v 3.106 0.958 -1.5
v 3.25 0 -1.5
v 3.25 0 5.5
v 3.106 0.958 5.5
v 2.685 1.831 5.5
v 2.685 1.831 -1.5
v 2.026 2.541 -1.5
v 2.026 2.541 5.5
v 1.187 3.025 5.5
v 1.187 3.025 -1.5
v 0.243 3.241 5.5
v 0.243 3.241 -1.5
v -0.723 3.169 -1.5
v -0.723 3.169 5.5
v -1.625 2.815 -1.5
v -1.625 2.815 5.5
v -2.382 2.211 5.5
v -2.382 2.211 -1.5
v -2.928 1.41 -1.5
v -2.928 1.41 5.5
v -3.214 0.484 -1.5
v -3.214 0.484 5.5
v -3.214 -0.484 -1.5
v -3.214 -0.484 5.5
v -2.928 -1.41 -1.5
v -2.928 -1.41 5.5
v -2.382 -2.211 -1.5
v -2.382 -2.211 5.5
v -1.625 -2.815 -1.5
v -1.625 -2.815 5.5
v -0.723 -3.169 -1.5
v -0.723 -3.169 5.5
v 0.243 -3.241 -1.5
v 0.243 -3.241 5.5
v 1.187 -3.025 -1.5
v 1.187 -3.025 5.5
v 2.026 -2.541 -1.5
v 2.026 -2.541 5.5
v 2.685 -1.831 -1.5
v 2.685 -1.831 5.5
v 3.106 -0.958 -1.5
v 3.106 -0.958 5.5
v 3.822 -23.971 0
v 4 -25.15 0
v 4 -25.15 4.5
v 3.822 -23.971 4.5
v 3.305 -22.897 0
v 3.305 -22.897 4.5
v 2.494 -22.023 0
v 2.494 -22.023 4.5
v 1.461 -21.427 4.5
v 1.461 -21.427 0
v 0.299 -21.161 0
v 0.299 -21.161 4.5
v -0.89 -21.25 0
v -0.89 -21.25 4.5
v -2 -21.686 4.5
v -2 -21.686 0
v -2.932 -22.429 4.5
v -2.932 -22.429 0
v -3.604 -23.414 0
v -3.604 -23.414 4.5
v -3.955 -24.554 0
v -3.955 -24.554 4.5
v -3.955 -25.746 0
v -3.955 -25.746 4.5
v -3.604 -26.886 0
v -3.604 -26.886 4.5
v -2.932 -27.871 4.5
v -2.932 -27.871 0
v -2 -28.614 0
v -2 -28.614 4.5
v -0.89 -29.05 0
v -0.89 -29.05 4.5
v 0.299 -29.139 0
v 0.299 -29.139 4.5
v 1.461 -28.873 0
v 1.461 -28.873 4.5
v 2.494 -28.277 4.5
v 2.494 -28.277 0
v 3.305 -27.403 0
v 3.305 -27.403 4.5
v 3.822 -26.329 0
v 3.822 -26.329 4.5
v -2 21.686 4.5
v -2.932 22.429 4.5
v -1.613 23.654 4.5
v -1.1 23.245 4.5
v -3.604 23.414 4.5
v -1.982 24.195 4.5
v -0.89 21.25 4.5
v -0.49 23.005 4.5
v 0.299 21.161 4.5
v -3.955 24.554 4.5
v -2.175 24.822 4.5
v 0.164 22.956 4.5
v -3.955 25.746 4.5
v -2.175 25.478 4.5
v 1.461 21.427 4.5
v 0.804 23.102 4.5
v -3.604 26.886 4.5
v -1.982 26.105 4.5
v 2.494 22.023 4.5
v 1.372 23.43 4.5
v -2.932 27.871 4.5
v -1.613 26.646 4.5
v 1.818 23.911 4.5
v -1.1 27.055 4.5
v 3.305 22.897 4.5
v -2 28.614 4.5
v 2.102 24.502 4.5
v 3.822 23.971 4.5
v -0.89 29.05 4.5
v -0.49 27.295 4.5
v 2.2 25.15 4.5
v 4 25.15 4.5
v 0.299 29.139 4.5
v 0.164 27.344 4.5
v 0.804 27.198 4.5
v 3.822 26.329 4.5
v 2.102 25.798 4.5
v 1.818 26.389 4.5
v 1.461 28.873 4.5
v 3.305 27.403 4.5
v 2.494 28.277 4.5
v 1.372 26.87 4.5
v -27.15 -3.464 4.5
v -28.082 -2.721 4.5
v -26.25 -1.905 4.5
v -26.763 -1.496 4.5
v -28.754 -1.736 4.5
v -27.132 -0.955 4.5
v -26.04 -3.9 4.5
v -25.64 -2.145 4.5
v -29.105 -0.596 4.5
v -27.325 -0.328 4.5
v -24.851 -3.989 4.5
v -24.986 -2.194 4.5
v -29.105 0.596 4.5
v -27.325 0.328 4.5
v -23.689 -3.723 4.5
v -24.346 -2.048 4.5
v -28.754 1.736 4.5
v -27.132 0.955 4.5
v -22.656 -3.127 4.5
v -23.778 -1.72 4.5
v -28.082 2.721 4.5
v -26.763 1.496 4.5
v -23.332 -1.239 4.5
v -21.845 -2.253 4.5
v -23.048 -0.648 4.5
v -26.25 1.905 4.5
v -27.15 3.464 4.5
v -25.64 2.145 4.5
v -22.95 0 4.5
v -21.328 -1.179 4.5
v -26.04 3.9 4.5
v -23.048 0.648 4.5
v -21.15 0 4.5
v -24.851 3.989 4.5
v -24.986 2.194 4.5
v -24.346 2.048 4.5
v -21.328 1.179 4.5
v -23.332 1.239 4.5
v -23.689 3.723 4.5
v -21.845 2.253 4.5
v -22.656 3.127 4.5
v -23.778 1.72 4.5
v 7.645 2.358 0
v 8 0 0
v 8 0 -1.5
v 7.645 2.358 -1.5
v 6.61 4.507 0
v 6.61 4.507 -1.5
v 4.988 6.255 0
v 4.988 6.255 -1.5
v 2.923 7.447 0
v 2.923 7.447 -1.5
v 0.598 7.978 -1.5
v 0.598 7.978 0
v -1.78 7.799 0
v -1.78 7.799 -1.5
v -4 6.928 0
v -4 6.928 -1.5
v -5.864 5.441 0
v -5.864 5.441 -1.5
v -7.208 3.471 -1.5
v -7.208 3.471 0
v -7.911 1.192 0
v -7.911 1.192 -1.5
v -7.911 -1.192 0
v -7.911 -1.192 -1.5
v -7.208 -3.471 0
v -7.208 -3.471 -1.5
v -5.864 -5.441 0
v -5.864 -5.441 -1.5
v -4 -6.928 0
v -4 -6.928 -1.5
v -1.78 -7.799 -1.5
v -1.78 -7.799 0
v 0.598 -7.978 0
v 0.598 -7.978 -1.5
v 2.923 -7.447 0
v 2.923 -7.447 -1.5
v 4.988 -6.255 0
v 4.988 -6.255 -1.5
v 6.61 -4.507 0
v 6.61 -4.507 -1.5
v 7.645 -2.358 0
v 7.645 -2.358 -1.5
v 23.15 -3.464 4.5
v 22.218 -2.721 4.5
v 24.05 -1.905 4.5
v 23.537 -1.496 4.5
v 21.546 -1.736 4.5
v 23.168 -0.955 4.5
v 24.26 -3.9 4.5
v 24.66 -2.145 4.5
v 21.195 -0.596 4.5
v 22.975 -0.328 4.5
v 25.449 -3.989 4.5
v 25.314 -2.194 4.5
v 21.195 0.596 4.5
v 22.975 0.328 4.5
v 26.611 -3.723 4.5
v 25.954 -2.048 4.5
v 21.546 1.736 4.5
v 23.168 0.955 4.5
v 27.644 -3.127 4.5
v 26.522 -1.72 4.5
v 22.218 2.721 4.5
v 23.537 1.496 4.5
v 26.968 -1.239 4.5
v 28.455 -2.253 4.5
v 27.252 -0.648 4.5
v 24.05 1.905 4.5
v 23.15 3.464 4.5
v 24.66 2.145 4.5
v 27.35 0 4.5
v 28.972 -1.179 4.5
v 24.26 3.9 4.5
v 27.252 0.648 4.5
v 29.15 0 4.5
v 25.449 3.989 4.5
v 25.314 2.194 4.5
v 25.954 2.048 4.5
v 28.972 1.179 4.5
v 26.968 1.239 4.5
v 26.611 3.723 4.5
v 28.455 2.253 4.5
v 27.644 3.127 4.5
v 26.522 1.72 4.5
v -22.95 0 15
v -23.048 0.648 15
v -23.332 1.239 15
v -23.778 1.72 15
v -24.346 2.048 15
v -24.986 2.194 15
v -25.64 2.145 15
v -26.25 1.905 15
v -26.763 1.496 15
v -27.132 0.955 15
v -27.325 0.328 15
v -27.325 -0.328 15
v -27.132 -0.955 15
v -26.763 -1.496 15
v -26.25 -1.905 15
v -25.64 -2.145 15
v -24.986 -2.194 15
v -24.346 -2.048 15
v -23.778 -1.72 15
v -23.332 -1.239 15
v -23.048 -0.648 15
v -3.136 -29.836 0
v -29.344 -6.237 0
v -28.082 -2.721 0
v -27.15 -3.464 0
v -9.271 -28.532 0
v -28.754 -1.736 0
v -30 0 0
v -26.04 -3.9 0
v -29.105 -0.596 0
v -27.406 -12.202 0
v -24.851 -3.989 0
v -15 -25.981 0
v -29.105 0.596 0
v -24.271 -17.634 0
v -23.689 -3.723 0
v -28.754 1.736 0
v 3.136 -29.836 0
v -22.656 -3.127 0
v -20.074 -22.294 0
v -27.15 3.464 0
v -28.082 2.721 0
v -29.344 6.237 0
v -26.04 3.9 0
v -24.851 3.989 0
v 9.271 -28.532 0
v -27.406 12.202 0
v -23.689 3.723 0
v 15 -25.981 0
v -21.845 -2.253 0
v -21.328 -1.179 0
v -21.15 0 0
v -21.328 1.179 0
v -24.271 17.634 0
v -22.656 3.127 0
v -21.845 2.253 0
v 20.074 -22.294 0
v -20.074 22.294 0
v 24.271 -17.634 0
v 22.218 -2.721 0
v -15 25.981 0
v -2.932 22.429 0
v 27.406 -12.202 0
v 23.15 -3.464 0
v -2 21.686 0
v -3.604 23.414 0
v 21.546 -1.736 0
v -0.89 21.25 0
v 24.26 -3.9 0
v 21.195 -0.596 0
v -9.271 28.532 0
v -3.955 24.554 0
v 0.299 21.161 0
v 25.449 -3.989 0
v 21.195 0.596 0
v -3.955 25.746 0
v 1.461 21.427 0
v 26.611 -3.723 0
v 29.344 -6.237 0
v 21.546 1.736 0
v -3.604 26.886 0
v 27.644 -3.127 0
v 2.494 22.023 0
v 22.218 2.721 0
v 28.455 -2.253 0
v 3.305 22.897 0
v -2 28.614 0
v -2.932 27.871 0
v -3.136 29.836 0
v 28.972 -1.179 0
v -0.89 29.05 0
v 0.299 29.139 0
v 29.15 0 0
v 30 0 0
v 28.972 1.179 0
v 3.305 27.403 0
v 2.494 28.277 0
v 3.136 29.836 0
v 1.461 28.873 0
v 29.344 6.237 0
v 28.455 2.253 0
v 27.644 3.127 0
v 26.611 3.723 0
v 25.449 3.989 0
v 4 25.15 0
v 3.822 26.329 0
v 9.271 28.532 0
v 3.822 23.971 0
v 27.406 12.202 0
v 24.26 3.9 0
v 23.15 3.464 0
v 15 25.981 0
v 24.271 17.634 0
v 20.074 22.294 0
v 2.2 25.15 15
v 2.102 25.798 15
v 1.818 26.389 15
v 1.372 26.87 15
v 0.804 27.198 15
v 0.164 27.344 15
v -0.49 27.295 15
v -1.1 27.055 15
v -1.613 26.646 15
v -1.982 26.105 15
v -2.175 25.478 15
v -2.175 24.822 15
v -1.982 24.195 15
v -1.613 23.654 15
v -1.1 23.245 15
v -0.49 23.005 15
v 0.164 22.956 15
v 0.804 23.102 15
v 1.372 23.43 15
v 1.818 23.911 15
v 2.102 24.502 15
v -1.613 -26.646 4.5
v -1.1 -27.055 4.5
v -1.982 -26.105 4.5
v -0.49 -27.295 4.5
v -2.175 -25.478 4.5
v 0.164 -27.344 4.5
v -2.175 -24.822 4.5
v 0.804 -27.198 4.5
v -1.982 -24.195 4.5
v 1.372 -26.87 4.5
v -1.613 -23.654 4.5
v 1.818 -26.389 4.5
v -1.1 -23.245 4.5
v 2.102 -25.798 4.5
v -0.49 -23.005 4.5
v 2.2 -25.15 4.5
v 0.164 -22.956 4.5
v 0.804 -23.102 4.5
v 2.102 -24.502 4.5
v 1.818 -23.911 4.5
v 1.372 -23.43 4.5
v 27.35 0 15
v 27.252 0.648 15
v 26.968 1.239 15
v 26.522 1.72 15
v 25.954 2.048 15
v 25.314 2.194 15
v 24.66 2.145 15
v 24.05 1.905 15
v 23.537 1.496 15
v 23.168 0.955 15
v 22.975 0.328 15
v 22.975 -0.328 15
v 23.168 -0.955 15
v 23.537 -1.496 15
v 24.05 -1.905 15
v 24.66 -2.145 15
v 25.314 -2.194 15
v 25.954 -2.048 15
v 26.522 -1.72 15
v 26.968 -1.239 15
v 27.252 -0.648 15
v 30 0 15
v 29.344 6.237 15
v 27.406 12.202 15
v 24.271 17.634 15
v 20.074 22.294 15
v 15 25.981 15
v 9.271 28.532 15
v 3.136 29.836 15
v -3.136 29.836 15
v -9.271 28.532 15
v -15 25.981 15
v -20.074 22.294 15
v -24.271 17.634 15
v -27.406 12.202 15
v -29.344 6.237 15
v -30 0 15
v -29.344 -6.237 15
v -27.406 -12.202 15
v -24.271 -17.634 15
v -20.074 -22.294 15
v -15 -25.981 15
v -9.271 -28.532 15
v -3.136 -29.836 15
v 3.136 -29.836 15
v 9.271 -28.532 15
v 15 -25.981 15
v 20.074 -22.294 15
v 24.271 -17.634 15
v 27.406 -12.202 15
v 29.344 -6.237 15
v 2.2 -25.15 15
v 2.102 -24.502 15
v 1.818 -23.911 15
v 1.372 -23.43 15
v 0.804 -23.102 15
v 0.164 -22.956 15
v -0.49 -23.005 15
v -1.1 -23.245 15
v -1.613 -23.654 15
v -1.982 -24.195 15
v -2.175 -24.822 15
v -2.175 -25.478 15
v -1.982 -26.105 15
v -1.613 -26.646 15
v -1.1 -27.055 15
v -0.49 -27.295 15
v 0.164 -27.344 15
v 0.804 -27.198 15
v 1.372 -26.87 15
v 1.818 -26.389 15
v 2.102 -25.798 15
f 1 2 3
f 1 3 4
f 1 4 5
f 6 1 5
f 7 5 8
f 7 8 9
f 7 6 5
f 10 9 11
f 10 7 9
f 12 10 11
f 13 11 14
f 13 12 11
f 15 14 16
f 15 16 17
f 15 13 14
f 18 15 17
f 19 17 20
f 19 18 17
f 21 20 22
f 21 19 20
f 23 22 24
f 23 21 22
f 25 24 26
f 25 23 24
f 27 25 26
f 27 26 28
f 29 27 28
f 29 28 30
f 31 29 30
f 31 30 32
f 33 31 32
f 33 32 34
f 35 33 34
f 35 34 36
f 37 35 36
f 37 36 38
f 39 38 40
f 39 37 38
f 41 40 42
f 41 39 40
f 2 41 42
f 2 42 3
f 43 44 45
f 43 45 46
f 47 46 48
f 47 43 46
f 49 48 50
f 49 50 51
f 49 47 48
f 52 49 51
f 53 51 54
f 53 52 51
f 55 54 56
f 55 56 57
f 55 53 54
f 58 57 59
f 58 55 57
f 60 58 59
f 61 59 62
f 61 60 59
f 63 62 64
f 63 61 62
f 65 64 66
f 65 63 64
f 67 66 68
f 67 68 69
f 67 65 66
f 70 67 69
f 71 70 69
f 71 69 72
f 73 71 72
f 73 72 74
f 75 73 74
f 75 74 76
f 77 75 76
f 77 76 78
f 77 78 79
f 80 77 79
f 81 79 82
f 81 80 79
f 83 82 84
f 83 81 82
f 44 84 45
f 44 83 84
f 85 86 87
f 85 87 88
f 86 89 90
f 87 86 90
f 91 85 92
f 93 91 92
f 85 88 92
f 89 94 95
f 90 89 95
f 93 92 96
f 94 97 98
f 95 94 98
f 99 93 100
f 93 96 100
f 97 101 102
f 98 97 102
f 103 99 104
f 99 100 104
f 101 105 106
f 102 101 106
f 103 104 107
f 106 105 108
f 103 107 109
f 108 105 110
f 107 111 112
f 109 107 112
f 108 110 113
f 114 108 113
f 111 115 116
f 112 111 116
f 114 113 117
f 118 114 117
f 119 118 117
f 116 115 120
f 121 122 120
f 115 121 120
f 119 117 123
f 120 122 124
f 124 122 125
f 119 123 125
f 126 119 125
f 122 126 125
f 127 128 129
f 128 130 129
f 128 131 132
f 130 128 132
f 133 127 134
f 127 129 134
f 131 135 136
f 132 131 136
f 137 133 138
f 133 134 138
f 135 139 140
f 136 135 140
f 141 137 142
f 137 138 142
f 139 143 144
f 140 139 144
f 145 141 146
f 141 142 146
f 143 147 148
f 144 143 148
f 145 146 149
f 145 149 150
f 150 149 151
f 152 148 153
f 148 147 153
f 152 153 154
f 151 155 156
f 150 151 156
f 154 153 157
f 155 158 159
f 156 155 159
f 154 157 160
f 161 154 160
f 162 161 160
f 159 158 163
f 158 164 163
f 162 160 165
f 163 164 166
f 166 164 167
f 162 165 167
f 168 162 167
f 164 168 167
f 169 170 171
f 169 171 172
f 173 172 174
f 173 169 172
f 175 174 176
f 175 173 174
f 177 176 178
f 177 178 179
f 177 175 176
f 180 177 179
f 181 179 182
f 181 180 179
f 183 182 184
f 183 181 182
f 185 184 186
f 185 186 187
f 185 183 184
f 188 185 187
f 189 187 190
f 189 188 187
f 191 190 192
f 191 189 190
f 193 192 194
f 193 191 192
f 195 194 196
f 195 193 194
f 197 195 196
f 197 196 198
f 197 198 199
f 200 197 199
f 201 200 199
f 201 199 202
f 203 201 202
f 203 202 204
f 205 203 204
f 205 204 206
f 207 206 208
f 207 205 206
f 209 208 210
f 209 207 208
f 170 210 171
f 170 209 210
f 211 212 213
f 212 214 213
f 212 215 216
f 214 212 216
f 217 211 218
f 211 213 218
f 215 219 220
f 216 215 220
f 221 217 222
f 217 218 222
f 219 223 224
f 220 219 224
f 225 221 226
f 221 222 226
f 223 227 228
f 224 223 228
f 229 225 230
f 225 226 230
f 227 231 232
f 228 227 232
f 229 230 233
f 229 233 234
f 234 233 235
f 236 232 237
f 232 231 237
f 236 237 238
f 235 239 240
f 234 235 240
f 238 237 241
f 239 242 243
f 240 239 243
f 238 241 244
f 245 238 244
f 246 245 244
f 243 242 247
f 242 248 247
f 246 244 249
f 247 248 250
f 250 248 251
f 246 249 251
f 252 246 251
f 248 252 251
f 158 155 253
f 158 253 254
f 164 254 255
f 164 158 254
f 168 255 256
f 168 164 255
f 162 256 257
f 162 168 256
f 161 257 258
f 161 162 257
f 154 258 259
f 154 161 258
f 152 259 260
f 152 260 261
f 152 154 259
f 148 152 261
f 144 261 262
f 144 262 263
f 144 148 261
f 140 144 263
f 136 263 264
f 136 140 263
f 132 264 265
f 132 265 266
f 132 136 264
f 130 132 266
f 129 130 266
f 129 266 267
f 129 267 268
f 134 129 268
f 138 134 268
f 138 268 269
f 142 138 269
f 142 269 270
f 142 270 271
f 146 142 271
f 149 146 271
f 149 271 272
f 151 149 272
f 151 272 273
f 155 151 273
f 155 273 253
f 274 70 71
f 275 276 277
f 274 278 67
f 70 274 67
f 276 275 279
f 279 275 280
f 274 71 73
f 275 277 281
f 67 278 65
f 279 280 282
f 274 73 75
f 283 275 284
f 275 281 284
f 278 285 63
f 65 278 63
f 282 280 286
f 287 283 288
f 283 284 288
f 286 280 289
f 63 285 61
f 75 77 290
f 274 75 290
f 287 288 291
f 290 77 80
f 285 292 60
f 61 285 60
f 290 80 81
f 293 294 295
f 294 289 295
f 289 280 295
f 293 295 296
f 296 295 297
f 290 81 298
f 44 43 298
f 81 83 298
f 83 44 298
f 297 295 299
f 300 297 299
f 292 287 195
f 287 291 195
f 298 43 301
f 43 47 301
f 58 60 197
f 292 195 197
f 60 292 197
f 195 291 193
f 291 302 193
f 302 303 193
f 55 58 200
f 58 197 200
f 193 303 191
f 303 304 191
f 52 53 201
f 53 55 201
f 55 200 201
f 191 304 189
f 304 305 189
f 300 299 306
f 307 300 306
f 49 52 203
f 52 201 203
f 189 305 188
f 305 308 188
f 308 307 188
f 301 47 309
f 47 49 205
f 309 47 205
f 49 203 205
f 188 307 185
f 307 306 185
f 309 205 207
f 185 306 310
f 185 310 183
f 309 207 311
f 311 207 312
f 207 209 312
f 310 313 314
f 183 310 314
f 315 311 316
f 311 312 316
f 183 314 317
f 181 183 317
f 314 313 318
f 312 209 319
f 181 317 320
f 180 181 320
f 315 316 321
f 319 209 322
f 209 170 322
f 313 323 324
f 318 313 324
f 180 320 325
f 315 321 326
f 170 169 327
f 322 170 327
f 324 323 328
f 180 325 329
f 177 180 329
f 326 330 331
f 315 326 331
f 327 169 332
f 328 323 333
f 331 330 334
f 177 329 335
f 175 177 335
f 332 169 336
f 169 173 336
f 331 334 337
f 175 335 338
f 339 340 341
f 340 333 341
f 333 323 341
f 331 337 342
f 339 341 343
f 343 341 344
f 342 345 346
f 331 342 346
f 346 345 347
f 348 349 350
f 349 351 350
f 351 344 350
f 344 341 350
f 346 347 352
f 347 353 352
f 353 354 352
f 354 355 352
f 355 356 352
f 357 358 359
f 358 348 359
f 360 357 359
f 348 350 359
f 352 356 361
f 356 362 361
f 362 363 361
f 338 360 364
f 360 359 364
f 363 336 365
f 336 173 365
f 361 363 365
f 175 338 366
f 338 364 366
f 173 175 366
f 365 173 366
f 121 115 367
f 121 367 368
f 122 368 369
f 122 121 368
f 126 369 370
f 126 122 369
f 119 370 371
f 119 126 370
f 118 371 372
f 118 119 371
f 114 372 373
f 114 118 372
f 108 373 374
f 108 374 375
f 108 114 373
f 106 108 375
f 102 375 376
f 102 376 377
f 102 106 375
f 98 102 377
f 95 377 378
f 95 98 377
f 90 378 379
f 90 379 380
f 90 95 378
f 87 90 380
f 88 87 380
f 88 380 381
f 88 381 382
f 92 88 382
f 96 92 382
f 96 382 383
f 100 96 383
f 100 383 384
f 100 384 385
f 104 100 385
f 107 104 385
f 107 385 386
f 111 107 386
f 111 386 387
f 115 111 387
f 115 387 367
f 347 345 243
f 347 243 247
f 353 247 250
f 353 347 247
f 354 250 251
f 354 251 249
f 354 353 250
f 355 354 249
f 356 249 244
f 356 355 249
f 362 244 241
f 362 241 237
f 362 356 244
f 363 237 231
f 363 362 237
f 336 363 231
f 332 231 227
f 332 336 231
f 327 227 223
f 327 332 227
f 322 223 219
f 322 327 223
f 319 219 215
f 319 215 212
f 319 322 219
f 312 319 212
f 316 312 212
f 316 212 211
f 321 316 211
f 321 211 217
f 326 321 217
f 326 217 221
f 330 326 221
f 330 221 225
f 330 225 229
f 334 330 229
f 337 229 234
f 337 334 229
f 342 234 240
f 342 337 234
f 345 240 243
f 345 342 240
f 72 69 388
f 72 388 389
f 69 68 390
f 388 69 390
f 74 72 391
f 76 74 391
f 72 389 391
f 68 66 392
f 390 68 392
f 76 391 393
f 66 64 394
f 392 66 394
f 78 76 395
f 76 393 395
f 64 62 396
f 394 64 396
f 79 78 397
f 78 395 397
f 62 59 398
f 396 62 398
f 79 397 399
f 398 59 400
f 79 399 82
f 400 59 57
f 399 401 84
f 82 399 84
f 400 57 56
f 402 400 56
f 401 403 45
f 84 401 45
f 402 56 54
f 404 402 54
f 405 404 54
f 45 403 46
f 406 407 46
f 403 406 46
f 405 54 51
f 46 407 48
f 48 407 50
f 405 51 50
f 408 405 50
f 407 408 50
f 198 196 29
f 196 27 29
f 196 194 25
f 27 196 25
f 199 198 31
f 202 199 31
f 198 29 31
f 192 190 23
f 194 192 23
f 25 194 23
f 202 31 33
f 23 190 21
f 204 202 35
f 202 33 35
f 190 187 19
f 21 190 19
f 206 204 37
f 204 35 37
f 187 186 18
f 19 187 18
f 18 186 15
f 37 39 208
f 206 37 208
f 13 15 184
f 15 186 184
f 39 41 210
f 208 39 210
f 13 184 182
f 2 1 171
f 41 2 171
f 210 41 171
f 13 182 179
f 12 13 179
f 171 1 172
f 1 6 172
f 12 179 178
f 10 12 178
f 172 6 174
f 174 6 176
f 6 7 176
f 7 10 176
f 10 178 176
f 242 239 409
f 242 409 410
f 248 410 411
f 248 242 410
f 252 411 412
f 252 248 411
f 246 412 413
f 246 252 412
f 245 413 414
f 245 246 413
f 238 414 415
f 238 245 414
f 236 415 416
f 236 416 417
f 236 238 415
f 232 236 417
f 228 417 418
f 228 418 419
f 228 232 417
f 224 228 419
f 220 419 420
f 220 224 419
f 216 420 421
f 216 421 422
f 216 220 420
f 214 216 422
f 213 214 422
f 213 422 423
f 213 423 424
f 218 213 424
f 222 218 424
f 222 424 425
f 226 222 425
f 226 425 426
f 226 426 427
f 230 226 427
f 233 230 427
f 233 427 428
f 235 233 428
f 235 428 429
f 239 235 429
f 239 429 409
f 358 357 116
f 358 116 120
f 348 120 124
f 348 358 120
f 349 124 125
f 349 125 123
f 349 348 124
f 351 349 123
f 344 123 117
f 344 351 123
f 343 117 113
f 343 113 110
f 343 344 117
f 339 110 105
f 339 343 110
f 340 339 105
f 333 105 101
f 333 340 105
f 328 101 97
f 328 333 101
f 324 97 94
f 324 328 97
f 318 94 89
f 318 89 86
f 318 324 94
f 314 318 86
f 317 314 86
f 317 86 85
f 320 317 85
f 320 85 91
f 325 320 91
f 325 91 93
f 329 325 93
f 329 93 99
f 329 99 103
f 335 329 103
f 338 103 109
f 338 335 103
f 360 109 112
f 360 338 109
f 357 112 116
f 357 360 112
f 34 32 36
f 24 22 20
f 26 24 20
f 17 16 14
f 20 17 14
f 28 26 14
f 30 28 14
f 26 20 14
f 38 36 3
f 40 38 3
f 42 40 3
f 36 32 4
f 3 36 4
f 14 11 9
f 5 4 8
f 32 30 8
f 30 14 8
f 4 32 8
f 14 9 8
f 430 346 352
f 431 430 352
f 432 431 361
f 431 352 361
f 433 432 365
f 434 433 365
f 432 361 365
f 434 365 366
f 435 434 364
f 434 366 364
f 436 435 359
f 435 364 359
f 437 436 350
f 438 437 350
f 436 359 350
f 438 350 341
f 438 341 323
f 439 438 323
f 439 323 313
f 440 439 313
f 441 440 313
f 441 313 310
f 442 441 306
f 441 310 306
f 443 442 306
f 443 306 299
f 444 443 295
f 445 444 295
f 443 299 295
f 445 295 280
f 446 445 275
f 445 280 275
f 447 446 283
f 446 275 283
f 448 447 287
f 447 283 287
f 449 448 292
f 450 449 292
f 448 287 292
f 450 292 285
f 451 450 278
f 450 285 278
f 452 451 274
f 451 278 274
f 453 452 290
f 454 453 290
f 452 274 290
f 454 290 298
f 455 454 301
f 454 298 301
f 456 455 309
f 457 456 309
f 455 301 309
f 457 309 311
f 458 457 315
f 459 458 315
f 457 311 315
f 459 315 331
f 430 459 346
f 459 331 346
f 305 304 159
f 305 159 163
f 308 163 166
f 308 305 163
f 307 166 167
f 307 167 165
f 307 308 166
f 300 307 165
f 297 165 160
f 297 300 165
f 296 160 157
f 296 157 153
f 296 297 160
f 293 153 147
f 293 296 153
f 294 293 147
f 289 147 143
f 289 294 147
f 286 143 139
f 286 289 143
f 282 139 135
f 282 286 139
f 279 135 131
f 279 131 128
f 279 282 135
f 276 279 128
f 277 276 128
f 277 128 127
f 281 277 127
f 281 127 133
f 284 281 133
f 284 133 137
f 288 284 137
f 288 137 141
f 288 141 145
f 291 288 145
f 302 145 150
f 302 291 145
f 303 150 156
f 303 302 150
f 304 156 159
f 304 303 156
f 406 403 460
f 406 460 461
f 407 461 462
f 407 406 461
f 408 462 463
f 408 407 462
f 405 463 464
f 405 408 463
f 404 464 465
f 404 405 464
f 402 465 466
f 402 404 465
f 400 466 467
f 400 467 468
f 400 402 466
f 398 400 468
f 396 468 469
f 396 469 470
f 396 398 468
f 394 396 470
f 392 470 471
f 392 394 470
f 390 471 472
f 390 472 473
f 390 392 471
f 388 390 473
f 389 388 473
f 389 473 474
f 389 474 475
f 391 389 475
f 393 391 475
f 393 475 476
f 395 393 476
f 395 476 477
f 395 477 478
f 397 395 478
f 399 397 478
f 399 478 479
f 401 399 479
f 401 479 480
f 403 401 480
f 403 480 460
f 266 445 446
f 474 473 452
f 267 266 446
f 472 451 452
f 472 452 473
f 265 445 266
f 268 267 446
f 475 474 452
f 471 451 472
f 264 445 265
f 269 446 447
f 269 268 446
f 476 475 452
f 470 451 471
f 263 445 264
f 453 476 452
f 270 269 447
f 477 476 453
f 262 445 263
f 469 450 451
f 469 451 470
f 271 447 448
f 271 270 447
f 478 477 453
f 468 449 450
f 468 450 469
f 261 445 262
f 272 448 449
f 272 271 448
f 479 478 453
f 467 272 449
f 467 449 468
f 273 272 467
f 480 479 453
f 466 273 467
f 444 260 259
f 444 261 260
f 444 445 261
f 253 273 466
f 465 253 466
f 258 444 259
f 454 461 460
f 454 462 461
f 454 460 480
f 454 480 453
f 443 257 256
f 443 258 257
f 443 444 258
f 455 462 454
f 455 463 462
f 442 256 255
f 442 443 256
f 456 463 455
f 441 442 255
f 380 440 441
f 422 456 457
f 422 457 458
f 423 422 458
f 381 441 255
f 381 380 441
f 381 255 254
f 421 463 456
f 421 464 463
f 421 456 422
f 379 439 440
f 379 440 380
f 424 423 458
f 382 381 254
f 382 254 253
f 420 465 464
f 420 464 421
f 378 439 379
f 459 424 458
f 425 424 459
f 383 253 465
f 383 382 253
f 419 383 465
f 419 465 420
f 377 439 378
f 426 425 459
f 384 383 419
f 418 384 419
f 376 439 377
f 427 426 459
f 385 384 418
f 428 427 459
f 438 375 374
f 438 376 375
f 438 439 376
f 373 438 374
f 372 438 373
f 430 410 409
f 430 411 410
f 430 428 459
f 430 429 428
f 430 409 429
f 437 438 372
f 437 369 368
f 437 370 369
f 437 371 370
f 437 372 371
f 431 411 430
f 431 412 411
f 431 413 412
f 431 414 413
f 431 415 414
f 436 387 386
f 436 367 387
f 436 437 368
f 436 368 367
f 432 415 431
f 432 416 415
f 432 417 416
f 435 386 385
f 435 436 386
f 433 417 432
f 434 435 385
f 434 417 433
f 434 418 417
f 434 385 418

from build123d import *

# Parameters (mm, degrees)
SKETCH1_R           = 30
BOSS_EXTRUDE1_DEPTH = 15
SKETCH2_R           = 2.2
CUT_EXTRUDE1_DEPTH  = 15
SKETCH3_R           = 4
CUT_EXTRUDE2_DEPTH  = 4.5
SKETCH5_R           = 8
BOSS_EXTRUDE2_DEPTH = 1.5
SKETCH8_R           = 3.25
CUT_EXTRUDE3_DEPTH  = 7


with BuildPart() as part:
    # Sketch1 → Boss-Extrude1 (new body)
    with BuildSketch(Plane.XY):
        Circle(SKETCH1_R)
    extrude(amount=BOSS_EXTRUDE1_DEPTH)

    # Sketch2 → Cut-Extrude1 (cut)
    with BuildSketch(Plane.XY):
        with Locations((0, 25.15)):
            Circle(SKETCH2_R)
        with Locations((25.15, 0)):
            Circle(SKETCH2_R)
        with Locations((0, -25.15)):
            Circle(SKETCH2_R)
        with Locations((-25.15, 0)):
            Circle(SKETCH2_R)
    extrude(amount=CUT_EXTRUDE1_DEPTH, mode=Mode.SUBTRACT)

    # Sketch3 → Cut-Extrude2 (cut)
    with BuildSketch(Plane.XY):
        with Locations((0, 25.15)):
            Circle(SKETCH3_R)
        with Locations((25.15, 0)):
            Circle(SKETCH3_R)
        with Locations((0, -25.15)):
            Circle(SKETCH3_R)
        with Locations((-25.15, 0)):
            Circle(SKETCH3_R)
    extrude(amount=CUT_EXTRUDE2_DEPTH, mode=Mode.SUBTRACT)

    # Sketch5 → Boss-Extrude2 (add)
    with BuildSketch(Plane.XY):
        Circle(SKETCH5_R)
    extrude(amount=-BOSS_EXTRUDE2_DEPTH)

    # Sketch8 → Cut-Extrude3 (cut)
    with BuildSketch(Plane.XY.offset(-1.5)):
        Circle(SKETCH8_R)
    extrude(amount=CUT_EXTRUDE3_DEPTH, mode=Mode.SUBTRACT)


solid = part.part
